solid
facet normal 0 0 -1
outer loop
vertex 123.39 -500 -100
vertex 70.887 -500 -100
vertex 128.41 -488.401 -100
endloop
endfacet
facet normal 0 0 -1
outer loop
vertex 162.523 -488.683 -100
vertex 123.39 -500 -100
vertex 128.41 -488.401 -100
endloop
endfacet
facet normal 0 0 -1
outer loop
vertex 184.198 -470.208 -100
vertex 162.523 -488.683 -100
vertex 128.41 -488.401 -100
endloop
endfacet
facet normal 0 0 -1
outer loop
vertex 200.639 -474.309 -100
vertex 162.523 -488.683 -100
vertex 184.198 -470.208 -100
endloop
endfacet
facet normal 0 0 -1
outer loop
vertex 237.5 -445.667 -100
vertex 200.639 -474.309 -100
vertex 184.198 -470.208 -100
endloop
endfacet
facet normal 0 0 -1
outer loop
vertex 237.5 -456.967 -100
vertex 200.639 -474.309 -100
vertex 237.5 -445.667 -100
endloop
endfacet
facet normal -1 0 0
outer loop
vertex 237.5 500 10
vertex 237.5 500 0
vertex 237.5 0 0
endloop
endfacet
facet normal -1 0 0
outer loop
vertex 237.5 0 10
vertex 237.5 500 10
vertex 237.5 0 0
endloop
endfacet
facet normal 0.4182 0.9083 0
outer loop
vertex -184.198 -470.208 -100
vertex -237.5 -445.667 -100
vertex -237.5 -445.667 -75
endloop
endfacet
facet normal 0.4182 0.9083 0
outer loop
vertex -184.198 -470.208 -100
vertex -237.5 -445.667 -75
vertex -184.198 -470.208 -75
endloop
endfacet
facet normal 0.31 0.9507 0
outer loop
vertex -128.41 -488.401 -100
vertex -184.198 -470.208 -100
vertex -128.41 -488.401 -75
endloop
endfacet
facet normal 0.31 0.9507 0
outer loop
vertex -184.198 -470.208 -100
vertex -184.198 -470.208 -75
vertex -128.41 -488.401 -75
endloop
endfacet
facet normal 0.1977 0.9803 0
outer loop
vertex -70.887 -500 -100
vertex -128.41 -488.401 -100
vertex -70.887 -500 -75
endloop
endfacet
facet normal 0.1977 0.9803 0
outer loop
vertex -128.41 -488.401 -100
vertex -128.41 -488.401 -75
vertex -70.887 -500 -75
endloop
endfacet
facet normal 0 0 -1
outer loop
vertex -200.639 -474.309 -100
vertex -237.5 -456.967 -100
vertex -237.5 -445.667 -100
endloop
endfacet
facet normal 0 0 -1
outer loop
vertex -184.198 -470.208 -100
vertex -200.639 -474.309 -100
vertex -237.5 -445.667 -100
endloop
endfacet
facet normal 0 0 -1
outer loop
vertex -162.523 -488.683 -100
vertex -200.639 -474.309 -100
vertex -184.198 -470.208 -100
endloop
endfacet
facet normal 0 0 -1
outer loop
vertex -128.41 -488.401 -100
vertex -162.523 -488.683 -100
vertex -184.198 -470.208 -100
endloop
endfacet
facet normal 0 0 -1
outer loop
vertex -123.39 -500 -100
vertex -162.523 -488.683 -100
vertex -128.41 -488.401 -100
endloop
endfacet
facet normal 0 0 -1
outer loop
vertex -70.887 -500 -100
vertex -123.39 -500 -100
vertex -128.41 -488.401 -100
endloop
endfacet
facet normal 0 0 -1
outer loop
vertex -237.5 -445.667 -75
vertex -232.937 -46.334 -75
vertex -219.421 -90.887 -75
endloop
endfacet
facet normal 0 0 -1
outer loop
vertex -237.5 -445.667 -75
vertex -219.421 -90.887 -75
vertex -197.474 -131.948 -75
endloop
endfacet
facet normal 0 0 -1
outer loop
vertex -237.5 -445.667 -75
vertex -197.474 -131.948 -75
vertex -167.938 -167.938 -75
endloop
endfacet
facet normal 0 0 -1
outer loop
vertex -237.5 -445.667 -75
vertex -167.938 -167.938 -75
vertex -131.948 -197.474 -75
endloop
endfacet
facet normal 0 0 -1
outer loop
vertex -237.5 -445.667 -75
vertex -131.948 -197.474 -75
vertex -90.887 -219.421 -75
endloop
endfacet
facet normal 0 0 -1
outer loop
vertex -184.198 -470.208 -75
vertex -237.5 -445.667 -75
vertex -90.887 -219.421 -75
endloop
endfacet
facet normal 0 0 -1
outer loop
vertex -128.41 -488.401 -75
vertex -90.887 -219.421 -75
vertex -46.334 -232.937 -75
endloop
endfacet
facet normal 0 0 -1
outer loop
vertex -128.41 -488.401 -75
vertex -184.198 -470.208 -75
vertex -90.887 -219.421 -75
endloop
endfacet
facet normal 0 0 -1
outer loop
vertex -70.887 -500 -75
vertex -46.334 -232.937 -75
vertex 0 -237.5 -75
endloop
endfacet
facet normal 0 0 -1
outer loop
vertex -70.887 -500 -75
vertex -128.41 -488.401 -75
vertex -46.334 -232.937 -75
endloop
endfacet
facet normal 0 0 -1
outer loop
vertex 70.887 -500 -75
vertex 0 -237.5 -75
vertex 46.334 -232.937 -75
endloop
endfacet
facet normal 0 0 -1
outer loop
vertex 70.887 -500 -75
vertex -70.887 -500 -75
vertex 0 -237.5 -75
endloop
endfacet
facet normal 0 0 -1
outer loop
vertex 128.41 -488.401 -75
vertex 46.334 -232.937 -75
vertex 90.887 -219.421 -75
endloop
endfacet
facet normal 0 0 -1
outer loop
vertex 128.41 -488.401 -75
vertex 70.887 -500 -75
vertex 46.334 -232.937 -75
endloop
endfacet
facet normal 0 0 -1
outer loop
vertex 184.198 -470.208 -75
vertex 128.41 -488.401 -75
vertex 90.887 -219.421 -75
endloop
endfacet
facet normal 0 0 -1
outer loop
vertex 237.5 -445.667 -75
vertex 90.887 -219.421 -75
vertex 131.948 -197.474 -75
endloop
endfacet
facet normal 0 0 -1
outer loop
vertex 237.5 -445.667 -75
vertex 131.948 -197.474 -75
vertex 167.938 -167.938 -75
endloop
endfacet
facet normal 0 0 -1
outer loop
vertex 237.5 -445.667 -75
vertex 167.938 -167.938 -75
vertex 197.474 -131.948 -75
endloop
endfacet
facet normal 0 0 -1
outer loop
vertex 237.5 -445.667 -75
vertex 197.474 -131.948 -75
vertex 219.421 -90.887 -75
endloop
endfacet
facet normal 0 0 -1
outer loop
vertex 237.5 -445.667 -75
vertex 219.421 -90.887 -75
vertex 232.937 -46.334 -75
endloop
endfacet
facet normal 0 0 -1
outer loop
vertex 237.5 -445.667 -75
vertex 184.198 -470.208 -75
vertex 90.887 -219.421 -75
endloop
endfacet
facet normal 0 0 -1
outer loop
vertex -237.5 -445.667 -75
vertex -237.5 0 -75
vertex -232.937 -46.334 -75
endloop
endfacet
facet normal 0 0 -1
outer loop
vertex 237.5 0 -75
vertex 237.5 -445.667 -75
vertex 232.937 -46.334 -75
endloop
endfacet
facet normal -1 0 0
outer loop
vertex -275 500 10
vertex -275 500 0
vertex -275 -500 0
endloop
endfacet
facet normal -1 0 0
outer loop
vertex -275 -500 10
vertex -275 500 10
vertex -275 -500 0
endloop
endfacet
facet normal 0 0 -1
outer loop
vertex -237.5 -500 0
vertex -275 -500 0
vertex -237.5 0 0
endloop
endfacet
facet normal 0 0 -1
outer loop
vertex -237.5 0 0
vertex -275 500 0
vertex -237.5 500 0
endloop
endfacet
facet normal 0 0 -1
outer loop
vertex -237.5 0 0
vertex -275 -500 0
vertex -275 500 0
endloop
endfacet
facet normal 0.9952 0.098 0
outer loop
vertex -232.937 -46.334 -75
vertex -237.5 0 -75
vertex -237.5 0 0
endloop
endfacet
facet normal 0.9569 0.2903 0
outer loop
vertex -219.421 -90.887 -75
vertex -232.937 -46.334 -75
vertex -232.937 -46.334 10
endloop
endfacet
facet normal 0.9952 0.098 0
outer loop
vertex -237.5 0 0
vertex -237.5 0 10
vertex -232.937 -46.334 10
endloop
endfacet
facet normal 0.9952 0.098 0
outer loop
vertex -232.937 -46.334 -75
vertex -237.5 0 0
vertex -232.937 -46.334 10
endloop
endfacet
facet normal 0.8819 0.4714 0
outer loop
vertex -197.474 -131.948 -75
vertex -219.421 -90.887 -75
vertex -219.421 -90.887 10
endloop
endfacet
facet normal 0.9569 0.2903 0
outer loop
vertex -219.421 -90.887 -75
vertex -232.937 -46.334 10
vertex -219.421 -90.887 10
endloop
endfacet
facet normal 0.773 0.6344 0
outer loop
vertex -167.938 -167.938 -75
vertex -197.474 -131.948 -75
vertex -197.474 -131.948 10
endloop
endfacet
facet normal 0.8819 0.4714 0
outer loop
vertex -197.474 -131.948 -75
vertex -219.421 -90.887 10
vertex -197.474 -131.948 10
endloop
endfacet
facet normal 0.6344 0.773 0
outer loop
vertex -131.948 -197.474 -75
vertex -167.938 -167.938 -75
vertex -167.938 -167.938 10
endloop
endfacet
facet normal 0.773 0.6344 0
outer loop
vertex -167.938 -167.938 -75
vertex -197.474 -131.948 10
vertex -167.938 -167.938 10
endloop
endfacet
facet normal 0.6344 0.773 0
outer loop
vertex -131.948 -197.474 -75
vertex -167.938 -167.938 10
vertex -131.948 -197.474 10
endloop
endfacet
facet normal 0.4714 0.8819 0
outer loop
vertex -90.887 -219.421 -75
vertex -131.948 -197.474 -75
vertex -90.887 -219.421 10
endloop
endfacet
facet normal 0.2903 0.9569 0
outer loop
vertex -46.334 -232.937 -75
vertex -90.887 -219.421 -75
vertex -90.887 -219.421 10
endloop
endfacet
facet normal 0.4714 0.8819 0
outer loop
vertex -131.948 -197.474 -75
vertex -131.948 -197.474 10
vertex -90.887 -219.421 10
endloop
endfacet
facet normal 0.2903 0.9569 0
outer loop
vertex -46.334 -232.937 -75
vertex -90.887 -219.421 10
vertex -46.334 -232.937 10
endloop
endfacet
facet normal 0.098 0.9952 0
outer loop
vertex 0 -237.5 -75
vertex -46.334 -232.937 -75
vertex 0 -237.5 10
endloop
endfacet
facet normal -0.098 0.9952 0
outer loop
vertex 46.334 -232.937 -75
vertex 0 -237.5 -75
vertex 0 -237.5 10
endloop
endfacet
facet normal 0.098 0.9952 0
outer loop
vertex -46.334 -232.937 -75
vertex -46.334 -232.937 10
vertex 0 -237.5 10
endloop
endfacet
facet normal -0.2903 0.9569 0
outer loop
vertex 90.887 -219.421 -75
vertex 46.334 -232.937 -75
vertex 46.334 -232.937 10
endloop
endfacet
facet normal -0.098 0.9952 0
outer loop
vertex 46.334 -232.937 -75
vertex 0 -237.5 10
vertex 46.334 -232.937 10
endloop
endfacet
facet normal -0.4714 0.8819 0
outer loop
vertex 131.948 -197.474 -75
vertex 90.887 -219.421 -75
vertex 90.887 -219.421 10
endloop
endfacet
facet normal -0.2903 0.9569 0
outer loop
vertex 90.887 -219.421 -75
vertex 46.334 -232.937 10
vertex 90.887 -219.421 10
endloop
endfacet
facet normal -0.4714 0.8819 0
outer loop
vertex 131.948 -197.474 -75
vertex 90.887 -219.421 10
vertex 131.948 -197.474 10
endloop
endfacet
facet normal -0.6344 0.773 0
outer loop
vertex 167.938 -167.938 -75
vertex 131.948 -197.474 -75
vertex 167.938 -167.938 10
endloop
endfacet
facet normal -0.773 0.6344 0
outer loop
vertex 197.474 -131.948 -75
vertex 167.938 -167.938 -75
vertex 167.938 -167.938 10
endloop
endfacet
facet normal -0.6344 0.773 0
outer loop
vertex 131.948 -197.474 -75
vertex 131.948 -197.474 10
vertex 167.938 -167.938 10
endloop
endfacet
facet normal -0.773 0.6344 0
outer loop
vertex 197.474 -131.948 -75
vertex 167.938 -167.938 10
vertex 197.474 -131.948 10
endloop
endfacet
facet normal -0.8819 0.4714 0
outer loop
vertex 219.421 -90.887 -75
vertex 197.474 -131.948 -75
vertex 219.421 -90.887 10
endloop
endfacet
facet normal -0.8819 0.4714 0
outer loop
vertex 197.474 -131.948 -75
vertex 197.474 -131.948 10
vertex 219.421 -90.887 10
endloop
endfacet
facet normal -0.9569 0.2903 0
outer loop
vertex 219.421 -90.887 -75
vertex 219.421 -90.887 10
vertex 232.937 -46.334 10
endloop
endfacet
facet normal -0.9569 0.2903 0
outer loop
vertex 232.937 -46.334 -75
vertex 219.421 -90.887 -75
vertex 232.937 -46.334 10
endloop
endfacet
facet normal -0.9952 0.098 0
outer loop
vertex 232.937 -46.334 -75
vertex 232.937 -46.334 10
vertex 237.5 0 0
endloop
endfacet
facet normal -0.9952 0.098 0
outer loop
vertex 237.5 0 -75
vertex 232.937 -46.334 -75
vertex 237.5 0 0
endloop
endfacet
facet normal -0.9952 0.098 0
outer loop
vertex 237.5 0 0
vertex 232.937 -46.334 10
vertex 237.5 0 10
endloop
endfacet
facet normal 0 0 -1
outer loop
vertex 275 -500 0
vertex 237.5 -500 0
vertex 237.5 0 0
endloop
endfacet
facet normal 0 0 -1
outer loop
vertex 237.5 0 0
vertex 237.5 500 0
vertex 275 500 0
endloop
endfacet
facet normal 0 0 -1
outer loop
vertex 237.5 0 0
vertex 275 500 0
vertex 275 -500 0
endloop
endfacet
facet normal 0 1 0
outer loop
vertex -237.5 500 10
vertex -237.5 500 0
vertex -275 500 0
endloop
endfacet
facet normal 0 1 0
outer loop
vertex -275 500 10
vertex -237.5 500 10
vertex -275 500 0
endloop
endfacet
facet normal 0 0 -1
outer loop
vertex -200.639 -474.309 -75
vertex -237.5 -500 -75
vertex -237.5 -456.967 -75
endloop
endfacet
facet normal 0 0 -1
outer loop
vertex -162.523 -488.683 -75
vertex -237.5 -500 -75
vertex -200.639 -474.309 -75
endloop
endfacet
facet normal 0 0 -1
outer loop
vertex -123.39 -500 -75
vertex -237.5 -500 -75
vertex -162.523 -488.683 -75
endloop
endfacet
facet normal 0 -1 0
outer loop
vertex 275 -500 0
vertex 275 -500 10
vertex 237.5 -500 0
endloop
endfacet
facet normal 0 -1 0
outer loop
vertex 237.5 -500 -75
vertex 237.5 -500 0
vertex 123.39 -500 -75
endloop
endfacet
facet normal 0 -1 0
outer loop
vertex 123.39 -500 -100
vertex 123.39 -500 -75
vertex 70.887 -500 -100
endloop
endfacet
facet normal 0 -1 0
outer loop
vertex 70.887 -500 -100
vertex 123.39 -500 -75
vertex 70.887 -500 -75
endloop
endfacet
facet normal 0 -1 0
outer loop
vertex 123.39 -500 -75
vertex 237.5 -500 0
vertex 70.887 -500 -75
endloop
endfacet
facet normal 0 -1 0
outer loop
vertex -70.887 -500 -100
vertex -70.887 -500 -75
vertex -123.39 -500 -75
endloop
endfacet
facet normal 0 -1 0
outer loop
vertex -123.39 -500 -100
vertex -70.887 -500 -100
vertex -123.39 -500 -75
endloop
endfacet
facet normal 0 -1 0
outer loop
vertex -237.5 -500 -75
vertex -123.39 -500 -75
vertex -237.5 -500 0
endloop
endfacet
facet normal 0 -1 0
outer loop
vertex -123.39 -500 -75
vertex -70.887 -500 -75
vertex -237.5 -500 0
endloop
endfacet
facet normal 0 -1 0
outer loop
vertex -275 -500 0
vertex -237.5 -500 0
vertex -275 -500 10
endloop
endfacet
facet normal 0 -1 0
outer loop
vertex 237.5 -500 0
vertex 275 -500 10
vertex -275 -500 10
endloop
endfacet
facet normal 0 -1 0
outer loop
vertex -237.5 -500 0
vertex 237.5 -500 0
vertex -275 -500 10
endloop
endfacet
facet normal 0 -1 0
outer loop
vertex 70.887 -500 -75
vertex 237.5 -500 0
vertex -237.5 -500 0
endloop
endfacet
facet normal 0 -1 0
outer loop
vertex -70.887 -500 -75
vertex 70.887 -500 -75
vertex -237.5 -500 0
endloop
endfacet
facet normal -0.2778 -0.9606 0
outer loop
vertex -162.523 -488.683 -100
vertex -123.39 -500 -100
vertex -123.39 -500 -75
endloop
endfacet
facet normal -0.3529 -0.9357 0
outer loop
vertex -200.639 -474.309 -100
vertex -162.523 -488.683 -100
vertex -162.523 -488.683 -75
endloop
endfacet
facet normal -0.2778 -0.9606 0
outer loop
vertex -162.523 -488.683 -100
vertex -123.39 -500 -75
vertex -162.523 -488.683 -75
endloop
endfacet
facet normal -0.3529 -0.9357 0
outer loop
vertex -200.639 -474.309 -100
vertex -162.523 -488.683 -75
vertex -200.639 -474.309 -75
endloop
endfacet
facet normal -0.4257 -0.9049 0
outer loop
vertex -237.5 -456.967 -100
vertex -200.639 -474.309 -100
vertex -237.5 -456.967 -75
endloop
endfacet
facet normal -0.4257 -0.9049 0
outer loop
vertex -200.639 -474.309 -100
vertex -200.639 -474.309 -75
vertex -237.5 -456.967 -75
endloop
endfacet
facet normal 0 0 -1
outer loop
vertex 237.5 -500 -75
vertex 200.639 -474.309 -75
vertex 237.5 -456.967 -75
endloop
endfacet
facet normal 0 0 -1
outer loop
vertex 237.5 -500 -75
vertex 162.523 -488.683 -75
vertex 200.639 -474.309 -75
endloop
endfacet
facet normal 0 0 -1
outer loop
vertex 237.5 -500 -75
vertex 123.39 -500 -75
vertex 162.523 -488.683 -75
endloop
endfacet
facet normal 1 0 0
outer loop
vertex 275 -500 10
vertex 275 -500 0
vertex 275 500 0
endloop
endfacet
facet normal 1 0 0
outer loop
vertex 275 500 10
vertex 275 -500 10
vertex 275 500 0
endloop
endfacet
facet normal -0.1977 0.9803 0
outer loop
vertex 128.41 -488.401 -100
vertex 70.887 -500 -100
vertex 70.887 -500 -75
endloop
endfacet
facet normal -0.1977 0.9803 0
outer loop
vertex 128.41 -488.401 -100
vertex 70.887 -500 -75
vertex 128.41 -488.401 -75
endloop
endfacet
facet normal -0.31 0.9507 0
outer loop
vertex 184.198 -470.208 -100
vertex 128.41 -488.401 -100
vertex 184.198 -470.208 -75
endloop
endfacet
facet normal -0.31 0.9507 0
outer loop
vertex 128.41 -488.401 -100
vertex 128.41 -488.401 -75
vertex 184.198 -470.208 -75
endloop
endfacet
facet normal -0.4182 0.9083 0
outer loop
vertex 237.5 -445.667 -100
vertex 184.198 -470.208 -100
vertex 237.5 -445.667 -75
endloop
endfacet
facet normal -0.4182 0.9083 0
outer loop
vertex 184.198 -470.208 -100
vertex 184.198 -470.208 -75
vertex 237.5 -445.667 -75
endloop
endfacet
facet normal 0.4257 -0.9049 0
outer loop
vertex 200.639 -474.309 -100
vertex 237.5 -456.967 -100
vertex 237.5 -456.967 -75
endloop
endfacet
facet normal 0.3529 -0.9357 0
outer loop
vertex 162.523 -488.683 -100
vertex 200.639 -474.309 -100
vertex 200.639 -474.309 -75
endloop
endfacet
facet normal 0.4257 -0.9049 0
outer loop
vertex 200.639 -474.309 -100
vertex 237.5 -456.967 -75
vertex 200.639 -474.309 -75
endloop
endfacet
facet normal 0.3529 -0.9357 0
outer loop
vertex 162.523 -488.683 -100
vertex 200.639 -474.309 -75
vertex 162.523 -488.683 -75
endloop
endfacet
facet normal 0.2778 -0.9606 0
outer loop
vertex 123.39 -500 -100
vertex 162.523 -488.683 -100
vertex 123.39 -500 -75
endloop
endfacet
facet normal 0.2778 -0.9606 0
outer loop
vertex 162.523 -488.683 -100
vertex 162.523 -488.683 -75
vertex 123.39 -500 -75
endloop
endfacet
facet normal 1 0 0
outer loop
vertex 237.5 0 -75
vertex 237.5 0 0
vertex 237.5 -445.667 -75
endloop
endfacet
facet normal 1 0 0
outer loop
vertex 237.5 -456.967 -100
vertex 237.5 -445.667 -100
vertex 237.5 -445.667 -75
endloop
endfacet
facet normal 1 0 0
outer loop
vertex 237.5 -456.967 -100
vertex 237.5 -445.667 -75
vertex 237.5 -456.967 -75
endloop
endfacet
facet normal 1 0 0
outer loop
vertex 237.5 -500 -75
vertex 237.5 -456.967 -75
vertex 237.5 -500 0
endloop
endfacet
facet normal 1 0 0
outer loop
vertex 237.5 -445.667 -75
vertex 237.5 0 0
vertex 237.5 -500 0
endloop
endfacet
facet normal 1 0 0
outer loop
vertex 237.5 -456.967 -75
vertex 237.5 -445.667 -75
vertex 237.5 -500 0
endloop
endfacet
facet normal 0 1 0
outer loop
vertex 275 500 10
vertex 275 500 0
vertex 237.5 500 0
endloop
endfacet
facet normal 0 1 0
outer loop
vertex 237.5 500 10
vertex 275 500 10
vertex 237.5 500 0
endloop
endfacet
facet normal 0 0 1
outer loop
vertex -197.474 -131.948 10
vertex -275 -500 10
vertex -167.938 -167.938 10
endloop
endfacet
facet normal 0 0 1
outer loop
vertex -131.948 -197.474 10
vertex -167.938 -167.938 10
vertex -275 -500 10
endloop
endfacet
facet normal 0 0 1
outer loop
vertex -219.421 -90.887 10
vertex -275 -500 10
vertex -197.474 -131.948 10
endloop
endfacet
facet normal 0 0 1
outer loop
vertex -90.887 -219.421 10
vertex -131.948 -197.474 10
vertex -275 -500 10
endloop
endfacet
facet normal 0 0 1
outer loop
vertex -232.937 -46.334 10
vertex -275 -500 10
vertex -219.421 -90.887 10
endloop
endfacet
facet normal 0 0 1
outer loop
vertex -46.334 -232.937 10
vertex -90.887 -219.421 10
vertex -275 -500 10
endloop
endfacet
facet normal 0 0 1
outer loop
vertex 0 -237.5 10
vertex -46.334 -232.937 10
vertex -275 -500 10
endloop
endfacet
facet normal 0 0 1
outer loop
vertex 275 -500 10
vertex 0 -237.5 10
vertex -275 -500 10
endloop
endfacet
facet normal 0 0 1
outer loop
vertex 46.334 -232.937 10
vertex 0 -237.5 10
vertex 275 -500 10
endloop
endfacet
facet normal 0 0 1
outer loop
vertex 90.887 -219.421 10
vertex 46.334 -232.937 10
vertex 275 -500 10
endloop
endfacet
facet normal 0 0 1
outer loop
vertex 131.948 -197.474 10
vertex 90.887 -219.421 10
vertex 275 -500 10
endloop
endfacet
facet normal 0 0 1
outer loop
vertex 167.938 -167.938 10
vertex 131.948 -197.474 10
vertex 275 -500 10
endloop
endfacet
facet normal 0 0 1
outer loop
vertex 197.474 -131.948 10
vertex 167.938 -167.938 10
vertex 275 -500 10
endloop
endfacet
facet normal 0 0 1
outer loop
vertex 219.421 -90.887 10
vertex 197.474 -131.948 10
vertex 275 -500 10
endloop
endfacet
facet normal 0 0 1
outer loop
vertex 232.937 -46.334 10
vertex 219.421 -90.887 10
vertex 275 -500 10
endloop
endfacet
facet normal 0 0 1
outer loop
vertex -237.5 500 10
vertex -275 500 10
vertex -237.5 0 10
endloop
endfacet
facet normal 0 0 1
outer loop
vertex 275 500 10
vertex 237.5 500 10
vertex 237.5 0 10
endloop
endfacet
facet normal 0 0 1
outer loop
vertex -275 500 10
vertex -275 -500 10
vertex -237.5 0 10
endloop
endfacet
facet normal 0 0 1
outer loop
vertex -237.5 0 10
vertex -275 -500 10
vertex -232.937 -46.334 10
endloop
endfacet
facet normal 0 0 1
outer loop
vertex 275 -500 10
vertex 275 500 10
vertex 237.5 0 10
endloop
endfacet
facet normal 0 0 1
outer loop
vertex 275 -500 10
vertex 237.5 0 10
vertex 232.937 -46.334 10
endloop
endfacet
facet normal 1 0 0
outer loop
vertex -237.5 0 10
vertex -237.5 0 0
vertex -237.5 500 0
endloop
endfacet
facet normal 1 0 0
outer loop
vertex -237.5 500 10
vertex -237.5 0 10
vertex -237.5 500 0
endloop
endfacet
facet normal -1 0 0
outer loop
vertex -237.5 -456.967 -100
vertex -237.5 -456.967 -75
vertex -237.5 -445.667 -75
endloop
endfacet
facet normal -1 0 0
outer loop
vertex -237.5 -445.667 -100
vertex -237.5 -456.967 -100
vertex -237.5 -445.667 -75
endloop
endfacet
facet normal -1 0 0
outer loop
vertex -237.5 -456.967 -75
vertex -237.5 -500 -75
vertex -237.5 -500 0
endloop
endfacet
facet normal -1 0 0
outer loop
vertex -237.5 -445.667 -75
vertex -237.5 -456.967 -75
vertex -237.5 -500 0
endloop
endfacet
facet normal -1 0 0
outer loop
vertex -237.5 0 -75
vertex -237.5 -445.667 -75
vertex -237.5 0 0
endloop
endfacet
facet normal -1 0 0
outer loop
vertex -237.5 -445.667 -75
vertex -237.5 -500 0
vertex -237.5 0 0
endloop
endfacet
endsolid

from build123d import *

# Parameters (mm, degrees)
F1_DEPTH = 10
F3_DEPTH = 75
F5_DEPTH = 25


with BuildPart() as f1:
    # F0 (on Top) → F1 (new body)
    with BuildSketch(Plane.XY):
        with BuildLine():
            ThreePointArc((237.5, 0), (0, -237.5), (-237.5, 0))
            Line((-237.5, 0), (-237.5, 500))
            Line((-237.5, 500), (-275, 500))
            Line((-275, 500), (-275, -500))
            Line((-275, -500), (275, -500))
            Line((275, -500), (275, 500))
            Line((275, 500), (237.5, 500))
            Line((237.5, 500), (237.5, 0))
        make_face()
    extrude(amount=F1_DEPTH)

    # F2 (on face) → F3 (join)
    with BuildSketch(Plane(origin=(0, 0, 0), x_dir=(1, 0, 0), z_dir=(0, 0, -1))):
        with BuildLine():
            Line((-237.5, 500), (-237.5, 0))
            ThreePointArc((-237.5, 0), (0, 237.5), (237.5, 0))
            Line((237.5, 0), (237.5, 500))
            Line((237.5, 500), (-237.5, 500))
        make_face()
    extrude(amount=F3_DEPTH)

    # F4 (on face) → F5 (join)
    with BuildSketch(Plane(origin=(0, 0, -75), x_dir=(1, 0, 0), z_dir=(0, 0, -1))):
        with BuildLine():
            ThreePointArc((70.887234, 500), (156.568516, 480.115923), (237.5, 445.666636))
            Line((237.5, 445.666636), (237.5, 456.966903))
            ThreePointArc((237.5, 456.966903), (181.723121, 481.873124), (123.389627, 500))
            Line((123.389627, 500), (70.887234, 500))
        make_face()
        with BuildLine():
            ThreePointArc((-123.389627, 500), (-181.723121, 481.873124), (-237.5, 456.966903))
            Line((-237.5, 456.966903), (-237.5, 445.666636))
            ThreePointArc((-237.5, 445.666636), (-156.568516, 480.115923), (-70.887234, 500))
            Line((-70.887234, 500), (-123.389627, 500))
        make_face()
    extrude(amount=F5_DEPTH)


solid = f1.part
